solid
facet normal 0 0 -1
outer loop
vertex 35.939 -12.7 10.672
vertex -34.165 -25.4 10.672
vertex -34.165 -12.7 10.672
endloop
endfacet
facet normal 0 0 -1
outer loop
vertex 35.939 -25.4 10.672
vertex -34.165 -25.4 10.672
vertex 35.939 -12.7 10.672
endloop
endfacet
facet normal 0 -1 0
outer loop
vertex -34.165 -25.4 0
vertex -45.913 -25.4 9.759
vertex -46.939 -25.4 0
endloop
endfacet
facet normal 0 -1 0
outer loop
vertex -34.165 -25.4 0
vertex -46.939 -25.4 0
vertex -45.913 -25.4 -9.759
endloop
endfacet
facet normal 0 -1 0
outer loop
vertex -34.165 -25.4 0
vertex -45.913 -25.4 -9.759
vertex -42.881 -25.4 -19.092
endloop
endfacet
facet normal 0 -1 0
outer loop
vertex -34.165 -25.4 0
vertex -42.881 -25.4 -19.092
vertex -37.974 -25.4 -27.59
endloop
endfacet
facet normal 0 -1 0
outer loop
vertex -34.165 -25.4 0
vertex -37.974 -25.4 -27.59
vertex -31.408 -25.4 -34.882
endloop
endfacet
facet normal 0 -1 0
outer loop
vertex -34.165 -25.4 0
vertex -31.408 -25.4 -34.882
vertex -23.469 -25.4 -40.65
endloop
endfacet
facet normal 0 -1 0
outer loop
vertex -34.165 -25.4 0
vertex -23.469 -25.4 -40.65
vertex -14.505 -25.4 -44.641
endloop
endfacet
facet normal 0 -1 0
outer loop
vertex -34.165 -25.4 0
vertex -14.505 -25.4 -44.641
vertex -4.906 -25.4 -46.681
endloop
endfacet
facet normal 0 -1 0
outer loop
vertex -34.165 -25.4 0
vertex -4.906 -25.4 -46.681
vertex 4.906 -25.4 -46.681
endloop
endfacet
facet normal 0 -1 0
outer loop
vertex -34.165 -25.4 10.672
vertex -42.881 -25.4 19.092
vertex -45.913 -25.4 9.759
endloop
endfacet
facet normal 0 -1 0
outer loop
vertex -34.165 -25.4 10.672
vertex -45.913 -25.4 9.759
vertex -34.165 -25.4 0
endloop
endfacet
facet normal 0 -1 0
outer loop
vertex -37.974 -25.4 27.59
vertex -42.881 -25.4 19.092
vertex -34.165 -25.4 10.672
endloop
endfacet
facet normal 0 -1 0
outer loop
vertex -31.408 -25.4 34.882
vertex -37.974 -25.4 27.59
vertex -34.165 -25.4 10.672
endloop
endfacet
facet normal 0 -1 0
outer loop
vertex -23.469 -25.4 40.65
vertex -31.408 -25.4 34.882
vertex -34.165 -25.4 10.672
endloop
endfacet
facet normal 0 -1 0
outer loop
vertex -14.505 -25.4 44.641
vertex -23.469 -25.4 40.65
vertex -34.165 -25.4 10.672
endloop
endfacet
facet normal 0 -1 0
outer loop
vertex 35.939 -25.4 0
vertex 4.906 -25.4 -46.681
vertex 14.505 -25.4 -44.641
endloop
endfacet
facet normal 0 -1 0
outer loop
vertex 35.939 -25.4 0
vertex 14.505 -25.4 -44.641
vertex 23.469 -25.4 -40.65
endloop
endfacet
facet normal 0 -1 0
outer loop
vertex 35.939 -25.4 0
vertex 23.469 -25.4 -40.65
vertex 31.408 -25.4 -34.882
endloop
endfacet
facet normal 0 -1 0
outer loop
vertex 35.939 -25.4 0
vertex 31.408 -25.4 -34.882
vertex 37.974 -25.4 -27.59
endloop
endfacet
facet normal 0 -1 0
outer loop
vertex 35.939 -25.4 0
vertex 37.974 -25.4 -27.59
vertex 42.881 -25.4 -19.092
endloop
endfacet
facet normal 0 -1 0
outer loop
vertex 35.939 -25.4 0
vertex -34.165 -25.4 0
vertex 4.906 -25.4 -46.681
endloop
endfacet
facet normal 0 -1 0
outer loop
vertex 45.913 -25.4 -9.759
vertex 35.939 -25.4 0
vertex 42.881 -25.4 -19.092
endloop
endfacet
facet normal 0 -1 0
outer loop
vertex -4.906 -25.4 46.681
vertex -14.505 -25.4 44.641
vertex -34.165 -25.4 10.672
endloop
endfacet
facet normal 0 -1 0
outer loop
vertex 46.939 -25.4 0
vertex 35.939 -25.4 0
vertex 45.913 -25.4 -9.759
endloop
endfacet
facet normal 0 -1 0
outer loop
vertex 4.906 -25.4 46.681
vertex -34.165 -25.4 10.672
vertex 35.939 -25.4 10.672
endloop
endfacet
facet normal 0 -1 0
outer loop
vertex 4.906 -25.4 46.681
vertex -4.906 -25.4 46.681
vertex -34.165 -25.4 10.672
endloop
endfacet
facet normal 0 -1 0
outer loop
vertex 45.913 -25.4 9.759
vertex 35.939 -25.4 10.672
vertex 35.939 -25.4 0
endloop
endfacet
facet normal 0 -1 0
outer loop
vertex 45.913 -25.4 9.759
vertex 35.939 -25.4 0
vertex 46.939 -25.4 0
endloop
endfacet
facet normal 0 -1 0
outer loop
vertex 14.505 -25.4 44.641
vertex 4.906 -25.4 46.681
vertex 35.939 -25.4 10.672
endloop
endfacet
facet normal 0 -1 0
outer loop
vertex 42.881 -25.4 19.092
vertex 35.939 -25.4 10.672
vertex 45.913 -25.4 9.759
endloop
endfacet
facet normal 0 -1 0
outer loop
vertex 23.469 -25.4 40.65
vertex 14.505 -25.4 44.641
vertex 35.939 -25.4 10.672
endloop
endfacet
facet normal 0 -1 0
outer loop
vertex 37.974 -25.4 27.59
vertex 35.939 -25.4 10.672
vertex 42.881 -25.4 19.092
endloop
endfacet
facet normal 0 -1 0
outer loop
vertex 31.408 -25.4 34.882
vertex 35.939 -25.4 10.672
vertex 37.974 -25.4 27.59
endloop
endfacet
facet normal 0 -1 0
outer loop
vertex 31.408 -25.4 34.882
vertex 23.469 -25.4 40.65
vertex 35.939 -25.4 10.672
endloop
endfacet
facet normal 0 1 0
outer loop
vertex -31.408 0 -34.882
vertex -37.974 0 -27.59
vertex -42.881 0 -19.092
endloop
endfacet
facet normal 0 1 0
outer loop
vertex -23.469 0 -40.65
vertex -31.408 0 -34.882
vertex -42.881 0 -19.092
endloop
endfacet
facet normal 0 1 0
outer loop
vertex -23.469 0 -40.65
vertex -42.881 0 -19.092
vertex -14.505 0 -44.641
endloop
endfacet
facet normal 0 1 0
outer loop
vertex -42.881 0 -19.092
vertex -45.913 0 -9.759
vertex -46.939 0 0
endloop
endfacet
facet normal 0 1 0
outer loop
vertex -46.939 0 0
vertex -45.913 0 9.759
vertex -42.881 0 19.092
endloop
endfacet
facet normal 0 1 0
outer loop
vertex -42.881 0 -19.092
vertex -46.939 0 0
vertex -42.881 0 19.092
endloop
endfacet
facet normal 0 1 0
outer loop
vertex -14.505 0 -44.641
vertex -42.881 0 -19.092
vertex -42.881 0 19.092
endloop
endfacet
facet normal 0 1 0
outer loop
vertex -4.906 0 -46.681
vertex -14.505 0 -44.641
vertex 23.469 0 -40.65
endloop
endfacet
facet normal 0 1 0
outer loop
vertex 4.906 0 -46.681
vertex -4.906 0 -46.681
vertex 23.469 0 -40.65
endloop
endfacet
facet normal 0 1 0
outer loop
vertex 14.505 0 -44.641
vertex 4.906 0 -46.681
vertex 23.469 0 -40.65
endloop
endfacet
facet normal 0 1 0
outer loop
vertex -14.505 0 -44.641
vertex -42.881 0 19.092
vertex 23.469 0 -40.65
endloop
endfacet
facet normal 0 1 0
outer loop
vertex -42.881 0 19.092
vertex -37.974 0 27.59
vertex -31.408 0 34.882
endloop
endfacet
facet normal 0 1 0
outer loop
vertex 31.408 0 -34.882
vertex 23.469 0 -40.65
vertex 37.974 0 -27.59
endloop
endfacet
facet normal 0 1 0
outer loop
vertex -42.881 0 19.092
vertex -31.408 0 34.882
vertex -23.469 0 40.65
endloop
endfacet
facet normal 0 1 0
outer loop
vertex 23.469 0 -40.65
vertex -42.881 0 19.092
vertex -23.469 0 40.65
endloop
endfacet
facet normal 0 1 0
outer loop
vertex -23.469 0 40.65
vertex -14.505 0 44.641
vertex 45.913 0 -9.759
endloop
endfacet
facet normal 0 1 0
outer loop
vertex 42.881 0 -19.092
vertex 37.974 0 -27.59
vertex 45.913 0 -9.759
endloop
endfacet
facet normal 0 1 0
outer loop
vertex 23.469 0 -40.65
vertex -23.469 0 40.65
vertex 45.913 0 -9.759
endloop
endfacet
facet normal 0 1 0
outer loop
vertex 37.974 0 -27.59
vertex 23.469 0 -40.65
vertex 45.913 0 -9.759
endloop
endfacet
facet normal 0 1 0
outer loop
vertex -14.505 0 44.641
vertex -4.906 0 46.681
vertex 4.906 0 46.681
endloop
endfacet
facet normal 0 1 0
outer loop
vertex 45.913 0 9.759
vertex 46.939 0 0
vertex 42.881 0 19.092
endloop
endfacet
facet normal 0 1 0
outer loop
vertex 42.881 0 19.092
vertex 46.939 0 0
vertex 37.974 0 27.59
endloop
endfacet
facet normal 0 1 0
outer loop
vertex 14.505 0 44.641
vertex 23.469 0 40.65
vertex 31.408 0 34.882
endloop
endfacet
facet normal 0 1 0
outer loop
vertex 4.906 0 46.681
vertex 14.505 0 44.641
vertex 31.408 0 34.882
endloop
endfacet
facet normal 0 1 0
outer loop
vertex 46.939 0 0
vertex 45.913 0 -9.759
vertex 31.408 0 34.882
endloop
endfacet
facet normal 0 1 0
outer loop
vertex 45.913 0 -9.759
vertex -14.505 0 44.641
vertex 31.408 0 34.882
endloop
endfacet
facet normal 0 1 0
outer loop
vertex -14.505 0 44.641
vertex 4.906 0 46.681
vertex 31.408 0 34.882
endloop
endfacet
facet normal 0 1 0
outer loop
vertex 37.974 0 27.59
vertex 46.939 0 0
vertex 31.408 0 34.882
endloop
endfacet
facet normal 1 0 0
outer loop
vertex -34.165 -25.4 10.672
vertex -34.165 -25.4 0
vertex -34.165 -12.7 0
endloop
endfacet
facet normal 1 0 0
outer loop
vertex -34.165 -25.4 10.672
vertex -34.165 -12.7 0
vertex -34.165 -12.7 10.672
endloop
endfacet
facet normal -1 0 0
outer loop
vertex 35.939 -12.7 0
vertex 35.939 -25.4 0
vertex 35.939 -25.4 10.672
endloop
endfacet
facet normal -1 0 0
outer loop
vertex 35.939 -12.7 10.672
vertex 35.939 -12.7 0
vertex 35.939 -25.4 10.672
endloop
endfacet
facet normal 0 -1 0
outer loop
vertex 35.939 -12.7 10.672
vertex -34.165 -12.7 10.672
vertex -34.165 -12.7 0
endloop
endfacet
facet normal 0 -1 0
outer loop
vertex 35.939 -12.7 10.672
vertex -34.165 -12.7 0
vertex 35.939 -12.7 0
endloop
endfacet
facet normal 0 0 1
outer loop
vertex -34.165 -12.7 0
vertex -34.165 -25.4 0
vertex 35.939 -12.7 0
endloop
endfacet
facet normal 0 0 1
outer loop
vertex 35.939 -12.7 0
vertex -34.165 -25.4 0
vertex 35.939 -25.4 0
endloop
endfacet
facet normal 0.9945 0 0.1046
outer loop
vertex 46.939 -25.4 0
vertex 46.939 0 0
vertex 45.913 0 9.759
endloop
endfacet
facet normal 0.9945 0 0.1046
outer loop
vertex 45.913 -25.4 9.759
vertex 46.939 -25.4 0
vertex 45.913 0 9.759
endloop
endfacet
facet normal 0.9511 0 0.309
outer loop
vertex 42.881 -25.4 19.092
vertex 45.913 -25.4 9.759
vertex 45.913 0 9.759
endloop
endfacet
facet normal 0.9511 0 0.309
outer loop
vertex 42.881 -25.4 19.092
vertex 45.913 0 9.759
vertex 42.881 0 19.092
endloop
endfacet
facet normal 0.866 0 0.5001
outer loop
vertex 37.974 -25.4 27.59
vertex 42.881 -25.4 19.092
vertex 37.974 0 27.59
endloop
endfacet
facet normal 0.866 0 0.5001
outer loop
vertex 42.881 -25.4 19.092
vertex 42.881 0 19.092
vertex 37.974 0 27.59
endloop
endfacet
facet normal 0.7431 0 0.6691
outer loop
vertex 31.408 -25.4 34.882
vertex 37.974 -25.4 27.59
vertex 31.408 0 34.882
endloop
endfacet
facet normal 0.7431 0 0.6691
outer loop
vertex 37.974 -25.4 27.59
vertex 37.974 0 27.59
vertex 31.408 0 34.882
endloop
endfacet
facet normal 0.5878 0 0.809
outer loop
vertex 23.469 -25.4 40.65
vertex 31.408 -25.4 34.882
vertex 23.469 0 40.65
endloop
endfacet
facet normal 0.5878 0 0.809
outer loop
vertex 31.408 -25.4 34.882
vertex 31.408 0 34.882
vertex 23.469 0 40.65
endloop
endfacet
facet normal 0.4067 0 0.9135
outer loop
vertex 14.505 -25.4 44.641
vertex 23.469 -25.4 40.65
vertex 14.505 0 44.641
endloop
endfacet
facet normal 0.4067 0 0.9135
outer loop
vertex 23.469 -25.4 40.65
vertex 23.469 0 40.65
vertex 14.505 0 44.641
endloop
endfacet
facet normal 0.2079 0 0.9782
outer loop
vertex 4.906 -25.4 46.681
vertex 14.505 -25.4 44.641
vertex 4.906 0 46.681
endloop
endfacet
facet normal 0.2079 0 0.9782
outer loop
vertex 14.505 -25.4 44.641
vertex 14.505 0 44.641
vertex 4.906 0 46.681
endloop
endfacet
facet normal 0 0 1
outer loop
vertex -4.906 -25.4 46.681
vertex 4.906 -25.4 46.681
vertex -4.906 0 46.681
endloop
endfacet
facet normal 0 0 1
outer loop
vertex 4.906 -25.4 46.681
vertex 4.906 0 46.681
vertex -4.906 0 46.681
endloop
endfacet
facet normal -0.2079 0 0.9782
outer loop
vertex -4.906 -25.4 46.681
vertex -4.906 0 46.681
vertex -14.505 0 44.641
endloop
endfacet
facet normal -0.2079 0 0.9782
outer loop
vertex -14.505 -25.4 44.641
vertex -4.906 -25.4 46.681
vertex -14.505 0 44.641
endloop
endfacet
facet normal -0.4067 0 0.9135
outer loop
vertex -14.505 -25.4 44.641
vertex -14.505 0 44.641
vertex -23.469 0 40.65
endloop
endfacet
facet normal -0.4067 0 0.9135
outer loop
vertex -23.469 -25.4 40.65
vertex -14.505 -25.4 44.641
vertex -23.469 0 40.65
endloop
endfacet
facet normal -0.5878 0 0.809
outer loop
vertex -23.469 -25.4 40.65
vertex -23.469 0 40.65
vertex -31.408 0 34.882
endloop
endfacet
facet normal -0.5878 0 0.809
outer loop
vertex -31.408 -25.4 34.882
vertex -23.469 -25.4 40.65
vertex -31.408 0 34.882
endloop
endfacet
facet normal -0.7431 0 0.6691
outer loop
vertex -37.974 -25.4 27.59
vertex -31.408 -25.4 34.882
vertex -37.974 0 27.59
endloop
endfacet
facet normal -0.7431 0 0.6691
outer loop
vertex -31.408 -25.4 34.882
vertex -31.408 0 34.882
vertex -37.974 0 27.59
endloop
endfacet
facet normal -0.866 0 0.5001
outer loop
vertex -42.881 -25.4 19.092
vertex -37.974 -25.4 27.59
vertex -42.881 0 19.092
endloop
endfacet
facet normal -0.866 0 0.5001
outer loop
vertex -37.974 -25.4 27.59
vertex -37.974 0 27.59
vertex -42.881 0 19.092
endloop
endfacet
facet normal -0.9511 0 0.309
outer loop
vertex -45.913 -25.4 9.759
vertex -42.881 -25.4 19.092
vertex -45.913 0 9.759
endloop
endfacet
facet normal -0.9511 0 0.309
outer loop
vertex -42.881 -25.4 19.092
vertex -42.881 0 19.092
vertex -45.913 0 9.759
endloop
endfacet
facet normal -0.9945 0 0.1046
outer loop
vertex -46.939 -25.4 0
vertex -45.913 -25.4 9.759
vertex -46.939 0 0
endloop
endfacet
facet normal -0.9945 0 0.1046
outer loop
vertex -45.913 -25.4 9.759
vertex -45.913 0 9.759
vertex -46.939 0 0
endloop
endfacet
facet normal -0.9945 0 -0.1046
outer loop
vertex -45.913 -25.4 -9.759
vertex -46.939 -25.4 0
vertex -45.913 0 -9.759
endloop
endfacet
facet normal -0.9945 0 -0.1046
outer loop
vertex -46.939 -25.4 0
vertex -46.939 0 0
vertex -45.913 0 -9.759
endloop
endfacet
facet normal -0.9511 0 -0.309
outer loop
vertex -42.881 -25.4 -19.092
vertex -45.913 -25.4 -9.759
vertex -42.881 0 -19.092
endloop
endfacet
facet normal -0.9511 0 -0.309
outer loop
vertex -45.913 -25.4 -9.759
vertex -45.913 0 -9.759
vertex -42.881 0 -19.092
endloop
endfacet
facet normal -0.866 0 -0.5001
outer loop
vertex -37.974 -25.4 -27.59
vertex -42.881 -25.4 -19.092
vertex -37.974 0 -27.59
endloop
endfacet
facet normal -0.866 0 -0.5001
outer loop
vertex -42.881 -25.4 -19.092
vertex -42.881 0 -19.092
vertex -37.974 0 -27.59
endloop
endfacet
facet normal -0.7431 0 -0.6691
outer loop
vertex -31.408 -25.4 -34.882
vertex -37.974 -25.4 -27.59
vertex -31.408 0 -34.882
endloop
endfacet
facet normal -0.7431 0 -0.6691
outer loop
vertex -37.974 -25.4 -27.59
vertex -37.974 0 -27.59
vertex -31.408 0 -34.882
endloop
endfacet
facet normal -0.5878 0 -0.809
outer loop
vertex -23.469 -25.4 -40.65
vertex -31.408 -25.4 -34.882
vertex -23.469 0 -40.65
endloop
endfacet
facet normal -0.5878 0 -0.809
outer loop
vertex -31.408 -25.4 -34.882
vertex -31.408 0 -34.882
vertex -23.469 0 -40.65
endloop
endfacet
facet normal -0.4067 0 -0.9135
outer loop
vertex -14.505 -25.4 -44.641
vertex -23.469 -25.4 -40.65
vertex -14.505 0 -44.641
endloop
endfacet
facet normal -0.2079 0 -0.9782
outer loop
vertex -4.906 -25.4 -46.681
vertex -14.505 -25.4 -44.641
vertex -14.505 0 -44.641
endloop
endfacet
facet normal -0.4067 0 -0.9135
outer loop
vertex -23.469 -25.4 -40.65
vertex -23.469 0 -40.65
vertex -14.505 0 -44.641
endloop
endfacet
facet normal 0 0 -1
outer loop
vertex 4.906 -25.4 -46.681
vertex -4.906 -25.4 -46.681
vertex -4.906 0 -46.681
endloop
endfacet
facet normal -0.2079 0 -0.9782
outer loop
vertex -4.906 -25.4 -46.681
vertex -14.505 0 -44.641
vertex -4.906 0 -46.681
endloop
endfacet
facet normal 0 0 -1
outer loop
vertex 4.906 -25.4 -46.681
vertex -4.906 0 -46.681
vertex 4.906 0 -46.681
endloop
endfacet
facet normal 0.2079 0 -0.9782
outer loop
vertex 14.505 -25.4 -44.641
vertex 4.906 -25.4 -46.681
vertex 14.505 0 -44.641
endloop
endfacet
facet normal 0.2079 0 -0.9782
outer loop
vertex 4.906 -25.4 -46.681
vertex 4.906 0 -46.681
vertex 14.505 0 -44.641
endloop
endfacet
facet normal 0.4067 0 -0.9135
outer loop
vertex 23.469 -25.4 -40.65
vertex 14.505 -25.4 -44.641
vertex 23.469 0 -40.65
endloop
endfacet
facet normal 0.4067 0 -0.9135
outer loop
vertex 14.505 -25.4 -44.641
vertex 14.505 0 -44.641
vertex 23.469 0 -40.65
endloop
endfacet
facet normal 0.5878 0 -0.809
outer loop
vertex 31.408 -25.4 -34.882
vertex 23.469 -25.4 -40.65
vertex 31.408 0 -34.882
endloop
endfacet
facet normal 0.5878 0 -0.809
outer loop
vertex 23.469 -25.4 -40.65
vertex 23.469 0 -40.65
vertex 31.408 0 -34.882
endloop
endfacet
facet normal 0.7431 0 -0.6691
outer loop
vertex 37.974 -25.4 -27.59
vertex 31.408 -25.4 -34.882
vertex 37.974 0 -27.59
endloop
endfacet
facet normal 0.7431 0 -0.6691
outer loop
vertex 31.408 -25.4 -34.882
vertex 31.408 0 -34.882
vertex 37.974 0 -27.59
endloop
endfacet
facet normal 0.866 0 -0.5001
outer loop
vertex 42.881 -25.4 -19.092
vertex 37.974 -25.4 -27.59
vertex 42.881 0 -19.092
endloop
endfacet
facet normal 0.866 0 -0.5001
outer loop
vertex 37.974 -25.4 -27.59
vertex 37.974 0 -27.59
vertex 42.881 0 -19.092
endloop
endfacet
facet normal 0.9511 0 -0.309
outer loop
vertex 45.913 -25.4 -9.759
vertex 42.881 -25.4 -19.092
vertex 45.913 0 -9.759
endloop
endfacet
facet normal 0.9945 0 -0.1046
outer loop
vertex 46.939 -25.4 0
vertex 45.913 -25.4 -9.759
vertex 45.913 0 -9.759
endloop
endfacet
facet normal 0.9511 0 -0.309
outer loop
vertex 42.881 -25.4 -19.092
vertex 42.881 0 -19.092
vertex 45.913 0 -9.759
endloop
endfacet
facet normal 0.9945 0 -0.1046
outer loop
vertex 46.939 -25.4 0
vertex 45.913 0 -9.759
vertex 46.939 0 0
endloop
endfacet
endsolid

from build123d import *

# Parameters (mm, degrees)
F0_R     = 46.938629
F1_DEPTH = 25.4
F2_W     = 70.104
F2_H     = 10.672496
F3_DEPTH = 12.7


with BuildPart() as f1:
    # F0 (on Front) → F1 (new body)
    with BuildSketch(Plane.XZ):
        Circle(F0_R)
    extrude(amount=F1_DEPTH)

    # F2 (on face) → F3 (cut, symmetric)
    with BuildSketch(Plane.XZ.offset(25.4)):
        with Locations((0.886691, 5.336248)):
            Rectangle(F2_W, F2_H)
    extrude(amount=F3_DEPTH, both=True, mode=Mode.SUBTRACT)


solid = f1.part
